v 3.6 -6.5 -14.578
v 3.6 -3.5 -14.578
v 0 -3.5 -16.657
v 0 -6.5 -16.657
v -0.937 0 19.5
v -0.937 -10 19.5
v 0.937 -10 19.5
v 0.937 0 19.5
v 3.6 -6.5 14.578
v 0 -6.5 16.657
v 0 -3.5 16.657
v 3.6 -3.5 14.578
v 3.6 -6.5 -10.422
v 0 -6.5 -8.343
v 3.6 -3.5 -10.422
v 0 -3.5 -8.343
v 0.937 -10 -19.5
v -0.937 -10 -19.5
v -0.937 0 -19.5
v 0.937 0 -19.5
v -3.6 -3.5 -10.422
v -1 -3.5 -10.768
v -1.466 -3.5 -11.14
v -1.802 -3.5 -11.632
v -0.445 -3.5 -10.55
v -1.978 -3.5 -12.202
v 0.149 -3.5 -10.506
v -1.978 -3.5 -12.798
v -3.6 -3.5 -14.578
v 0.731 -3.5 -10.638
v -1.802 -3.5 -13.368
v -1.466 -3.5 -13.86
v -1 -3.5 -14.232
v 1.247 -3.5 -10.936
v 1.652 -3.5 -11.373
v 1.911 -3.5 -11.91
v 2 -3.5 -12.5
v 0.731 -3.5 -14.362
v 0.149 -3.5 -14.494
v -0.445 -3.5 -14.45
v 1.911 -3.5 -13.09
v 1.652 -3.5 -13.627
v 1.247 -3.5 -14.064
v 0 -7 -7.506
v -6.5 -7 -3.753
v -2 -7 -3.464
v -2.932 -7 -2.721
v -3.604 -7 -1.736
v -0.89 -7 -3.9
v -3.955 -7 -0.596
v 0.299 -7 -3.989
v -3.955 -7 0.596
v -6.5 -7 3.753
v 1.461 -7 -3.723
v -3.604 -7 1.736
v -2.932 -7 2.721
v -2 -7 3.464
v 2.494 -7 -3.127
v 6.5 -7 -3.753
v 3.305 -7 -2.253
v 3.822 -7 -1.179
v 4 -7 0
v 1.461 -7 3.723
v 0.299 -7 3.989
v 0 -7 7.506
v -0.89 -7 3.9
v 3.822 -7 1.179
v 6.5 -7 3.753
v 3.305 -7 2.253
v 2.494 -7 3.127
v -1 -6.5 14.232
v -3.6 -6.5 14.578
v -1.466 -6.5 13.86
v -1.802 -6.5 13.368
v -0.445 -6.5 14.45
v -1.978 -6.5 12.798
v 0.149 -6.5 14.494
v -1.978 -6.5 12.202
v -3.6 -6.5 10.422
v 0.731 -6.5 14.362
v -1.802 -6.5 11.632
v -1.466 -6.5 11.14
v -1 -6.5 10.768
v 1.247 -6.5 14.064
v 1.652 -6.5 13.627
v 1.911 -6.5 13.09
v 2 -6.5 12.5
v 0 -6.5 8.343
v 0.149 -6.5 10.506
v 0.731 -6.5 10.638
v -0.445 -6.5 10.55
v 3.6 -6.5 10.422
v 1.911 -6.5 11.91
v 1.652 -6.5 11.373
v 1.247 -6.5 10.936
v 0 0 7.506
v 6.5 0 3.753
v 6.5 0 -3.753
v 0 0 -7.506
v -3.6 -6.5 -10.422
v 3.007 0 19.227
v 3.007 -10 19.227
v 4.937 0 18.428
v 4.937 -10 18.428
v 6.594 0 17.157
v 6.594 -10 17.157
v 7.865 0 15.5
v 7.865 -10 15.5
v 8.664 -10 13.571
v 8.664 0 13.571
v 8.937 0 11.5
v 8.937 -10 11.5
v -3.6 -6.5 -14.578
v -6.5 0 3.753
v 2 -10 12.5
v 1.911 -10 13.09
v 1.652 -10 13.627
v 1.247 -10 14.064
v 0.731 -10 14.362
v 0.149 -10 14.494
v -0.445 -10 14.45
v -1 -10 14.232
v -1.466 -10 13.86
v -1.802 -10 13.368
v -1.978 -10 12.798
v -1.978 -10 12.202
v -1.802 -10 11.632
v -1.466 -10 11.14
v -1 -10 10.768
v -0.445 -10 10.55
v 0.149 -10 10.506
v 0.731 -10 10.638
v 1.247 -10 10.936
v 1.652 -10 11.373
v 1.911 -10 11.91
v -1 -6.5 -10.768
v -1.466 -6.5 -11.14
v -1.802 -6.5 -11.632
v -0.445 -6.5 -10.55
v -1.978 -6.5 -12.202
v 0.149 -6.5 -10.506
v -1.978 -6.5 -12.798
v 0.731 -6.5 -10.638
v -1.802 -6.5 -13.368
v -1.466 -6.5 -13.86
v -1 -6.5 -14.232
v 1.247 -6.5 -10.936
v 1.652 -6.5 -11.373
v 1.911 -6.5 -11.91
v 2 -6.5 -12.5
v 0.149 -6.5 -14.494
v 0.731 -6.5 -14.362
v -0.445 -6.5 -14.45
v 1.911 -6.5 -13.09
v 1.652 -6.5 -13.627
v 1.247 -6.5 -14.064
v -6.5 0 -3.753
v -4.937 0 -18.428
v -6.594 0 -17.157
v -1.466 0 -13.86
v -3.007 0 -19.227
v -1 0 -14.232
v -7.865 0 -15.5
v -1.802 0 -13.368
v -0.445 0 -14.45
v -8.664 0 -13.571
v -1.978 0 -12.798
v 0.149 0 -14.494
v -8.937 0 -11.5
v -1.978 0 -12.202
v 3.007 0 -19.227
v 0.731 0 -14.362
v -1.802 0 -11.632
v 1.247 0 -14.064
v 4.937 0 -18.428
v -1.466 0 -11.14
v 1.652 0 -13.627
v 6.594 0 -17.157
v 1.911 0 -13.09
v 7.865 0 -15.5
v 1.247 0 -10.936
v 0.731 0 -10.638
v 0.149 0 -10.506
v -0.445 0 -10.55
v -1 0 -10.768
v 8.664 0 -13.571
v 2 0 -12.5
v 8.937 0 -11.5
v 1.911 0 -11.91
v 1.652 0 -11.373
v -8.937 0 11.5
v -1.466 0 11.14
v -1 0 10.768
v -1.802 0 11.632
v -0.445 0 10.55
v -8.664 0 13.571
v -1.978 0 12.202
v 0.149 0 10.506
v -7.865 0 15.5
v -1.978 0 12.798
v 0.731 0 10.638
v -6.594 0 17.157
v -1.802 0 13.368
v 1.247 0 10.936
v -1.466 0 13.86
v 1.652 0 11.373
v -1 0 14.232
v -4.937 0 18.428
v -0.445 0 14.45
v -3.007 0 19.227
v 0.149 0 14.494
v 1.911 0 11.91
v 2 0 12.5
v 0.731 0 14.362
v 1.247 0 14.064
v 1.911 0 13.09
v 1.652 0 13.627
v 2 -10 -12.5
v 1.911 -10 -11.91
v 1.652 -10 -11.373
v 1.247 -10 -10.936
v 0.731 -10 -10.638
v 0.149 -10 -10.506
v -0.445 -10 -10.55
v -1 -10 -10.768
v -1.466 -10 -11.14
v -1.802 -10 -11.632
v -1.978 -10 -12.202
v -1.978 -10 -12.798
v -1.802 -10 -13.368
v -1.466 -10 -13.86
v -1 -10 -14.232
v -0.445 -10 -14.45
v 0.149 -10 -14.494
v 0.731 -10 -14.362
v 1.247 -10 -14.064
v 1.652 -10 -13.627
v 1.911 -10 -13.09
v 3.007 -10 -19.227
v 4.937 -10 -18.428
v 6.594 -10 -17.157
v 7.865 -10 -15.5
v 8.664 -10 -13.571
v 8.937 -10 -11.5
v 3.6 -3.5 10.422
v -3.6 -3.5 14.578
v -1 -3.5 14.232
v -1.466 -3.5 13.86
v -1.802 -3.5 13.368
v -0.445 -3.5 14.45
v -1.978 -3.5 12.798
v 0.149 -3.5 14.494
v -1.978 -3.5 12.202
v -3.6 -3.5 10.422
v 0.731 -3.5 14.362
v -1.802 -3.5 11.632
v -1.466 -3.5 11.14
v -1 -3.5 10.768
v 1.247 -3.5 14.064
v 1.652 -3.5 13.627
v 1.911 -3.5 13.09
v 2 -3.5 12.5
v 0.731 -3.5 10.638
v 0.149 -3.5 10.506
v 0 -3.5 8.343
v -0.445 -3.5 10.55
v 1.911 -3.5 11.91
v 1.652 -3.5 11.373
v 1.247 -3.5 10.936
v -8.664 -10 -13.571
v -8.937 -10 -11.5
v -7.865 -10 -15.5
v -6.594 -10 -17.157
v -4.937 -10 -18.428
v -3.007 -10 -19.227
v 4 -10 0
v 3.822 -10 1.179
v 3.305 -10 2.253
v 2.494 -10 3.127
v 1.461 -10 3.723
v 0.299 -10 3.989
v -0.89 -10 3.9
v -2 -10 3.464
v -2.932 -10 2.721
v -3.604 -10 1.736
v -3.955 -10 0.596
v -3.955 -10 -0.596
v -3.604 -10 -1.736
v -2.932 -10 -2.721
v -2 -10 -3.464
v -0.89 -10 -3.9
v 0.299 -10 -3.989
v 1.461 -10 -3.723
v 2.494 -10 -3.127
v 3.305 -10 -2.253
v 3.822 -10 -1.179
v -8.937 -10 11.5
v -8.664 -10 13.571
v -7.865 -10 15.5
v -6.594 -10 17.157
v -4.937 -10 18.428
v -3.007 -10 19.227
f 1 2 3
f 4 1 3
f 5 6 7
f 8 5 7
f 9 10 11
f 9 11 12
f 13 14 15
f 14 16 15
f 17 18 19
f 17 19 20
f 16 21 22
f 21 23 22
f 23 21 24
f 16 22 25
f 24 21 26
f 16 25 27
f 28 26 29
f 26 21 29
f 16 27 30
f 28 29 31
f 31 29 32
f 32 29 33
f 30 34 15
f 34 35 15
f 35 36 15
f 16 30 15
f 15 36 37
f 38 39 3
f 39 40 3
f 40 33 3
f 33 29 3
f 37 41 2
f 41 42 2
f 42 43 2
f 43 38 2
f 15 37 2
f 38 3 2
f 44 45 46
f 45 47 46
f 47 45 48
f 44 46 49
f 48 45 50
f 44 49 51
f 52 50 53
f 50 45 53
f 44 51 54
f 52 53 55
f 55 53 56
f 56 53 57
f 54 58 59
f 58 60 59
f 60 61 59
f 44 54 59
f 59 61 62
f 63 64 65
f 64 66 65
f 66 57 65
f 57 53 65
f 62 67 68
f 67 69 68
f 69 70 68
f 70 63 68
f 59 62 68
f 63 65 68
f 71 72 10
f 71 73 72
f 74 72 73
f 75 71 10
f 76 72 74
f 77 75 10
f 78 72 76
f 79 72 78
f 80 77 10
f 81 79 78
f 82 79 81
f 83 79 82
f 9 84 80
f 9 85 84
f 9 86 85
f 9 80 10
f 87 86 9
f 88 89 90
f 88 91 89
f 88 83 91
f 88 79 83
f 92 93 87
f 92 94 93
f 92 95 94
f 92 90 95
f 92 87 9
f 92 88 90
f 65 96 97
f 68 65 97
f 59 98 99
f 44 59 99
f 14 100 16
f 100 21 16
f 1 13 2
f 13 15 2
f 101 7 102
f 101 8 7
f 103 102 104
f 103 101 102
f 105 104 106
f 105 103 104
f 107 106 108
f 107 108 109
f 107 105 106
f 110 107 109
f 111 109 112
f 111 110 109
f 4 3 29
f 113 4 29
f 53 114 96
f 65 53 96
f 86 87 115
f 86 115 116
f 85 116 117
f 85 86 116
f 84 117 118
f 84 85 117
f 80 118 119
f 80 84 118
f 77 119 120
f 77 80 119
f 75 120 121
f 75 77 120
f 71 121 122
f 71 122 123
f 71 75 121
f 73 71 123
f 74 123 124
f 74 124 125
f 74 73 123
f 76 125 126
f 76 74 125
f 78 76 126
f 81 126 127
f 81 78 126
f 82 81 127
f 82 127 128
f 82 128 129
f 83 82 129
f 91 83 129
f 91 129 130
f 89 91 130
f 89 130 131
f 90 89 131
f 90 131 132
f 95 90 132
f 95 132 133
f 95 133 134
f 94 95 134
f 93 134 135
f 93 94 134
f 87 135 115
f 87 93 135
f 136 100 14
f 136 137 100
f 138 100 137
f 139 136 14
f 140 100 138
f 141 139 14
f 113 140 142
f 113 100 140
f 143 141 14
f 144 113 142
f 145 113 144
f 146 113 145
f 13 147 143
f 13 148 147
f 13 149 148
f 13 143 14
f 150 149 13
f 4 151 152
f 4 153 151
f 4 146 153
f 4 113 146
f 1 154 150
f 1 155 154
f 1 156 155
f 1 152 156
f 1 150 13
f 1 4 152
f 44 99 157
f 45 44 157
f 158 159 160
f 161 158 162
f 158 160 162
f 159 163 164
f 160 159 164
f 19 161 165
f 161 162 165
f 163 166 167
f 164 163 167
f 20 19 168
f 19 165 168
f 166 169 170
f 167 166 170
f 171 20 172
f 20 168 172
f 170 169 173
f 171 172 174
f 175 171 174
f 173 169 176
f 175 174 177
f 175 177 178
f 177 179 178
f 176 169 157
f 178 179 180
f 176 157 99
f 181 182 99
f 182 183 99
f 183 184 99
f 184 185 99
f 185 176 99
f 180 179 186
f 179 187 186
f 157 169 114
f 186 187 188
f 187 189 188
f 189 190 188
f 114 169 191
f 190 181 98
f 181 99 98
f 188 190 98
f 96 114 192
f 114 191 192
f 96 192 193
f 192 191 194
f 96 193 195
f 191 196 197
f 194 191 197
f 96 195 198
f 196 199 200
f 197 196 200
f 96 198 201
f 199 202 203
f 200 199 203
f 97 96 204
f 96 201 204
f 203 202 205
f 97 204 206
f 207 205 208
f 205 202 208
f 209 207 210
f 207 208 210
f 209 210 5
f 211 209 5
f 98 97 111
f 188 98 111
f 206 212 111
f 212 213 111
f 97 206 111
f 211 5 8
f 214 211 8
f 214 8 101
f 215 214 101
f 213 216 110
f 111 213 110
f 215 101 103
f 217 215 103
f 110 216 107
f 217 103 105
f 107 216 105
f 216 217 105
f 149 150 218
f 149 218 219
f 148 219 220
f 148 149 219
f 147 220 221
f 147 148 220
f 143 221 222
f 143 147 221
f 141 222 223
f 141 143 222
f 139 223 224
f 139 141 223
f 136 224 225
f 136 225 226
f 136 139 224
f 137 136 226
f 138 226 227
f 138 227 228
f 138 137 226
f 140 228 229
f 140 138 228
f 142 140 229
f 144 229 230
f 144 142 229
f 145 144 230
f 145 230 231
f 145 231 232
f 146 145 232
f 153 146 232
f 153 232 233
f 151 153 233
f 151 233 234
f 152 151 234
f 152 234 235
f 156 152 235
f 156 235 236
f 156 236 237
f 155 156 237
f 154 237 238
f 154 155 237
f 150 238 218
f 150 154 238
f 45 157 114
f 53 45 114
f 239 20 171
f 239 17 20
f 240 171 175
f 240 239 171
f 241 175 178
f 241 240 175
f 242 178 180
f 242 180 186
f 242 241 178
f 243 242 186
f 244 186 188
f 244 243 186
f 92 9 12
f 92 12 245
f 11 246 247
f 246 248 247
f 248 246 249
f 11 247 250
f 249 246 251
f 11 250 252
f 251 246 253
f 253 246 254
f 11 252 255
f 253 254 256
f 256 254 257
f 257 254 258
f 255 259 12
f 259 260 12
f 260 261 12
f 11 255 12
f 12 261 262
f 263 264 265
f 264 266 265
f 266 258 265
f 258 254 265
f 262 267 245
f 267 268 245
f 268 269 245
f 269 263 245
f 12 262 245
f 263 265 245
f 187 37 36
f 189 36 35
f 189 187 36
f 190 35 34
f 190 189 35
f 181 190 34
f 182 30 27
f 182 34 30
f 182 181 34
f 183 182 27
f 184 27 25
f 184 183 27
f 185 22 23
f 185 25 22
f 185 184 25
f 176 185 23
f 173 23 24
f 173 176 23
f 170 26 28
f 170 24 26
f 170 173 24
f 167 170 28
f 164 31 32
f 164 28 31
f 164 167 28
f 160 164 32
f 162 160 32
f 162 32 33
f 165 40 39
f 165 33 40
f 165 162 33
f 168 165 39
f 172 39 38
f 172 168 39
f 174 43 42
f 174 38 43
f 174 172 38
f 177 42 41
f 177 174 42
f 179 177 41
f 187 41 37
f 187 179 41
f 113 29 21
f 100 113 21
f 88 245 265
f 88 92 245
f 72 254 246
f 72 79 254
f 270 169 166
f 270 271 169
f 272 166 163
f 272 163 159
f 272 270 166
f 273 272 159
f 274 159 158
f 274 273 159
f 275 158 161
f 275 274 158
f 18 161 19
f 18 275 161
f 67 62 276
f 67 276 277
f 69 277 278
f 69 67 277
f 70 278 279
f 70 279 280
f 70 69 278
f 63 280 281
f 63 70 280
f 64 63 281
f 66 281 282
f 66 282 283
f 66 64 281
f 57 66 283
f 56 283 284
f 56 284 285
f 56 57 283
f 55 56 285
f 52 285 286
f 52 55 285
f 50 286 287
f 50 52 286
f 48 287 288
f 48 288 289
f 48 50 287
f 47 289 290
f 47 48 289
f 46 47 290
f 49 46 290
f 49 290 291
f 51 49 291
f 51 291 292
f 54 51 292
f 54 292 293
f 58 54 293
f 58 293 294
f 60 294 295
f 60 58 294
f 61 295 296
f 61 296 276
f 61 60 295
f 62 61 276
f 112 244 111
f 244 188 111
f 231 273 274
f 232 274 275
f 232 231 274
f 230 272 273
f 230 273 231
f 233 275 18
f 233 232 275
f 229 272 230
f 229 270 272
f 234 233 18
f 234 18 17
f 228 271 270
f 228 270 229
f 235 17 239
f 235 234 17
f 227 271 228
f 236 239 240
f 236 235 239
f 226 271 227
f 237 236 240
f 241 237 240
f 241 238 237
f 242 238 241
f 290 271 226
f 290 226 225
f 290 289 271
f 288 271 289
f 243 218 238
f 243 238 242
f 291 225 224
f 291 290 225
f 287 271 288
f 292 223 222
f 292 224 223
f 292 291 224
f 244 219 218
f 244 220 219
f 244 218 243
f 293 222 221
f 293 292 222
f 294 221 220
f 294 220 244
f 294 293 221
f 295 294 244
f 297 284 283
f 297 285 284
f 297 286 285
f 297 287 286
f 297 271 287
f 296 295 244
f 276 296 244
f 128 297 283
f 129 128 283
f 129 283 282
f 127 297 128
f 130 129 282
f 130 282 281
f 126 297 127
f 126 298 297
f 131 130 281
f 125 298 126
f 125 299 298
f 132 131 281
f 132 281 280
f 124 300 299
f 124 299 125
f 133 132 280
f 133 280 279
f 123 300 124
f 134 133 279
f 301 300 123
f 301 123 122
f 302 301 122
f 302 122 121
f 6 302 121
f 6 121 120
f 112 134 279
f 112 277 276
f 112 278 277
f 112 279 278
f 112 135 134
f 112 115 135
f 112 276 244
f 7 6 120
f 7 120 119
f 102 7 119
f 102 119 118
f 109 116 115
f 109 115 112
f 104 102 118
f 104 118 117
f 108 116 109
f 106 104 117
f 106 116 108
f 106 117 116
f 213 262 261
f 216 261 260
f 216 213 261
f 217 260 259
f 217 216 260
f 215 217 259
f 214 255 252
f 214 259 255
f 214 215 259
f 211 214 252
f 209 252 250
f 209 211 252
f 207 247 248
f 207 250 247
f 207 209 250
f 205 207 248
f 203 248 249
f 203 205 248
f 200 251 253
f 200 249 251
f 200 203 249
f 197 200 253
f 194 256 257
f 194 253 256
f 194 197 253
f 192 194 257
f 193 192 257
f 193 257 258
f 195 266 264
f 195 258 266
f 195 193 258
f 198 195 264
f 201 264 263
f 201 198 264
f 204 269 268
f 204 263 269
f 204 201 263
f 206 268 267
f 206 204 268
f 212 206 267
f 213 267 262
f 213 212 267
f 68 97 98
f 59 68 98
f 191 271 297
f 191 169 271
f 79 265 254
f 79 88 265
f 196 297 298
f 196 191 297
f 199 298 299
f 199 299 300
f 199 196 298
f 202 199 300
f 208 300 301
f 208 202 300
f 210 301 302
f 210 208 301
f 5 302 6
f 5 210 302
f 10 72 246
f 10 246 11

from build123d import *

# Parameters (mm, degrees)
F0_W     = 17.873502
F0_H     = 39
F0_R     = 2
F1_DEPTH = 7
F2_W     = 17.873502
F2_H     = 39
F2_R     = 2
F2_R_2   = 4
F3_DEPTH = 3
F6_DEPTH = 1.5
F7_R     = 8


with BuildPart() as f1:
    # F0 (on Front) → F1 (new body)
    with BuildSketch(Plane.XZ):
        Rectangle(F0_W, F0_H)
        with Locations((0, -12.5)):
            Circle(F0_R, mode=Mode.SUBTRACT)
        Polygon((0, 7.505553), (6.5, 3.752777), (6.5, -3.752777), (0, -7.505553), (-6.5, -3.752777), (-6.5, 3.752777), align=None, mode=Mode.SUBTRACT)
        with Locations((0, 12.5)):
            Circle(F0_R, mode=Mode.SUBTRACT)
    extrude(amount=F1_DEPTH)

    # F2 (on face) → F3 (join)
    with BuildSketch(Plane.XZ.offset(7)):
        Rectangle(F2_W, F2_H)
        with Locations((0, -12.5)):
            Circle(F2_R, mode=Mode.SUBTRACT)
        Polygon((-6.5, -3.752777), (-6.5, 3.752777), (0, 7.505553), (6.5, 3.752777), (6.5, -3.752777), (0, -7.505553), align=None, mode=Mode.SUBTRACT)
        with Locations((0, 12.5)):
            Circle(F2_R, mode=Mode.SUBTRACT)
        Polygon((0, 7.505553), (-6.5, 3.752777), (-6.5, -3.752777), (0, -7.505553), (6.5, -3.752777), (6.5, 3.752777), align=None)
        Circle(F2_R_2, mode=Mode.SUBTRACT)
    extrude(amount=F3_DEPTH)

    # F5 (on offset) → F6 (cut, symmetric)
    with BuildSketch(Plane(origin=(0, -5, 0), x_dir=(1, 0, 0), z_dir=(0, 1, 0))):
        Polygon((3.6, -14.578461), (3.6, -10.421539), (0, -8.343078), (-3.6, -10.421539), (-3.6, -14.578461), (0, -16.656922), align=None)
        Polygon((3.6, 10.421539), (3.6, 14.578461), (0, 16.656922), (-3.6, 14.578461), (-3.6, 10.421539), (0, 8.343078), align=None)
    extrude(amount=F6_DEPTH, both=True, mode=Mode.SUBTRACT)

    # F7
    f7_edges = [f1.edges().sort_by_distance(p)[0] for p in [
        (-8.936751, -5, -19.5),
        (8.936751, -5, -19.5),
        (-8.936751, -5, 19.5),
        (8.936751, -5, 19.5),
    ]]
    fillet(f7_edges, radius=F7_R)


solid = f1.part
